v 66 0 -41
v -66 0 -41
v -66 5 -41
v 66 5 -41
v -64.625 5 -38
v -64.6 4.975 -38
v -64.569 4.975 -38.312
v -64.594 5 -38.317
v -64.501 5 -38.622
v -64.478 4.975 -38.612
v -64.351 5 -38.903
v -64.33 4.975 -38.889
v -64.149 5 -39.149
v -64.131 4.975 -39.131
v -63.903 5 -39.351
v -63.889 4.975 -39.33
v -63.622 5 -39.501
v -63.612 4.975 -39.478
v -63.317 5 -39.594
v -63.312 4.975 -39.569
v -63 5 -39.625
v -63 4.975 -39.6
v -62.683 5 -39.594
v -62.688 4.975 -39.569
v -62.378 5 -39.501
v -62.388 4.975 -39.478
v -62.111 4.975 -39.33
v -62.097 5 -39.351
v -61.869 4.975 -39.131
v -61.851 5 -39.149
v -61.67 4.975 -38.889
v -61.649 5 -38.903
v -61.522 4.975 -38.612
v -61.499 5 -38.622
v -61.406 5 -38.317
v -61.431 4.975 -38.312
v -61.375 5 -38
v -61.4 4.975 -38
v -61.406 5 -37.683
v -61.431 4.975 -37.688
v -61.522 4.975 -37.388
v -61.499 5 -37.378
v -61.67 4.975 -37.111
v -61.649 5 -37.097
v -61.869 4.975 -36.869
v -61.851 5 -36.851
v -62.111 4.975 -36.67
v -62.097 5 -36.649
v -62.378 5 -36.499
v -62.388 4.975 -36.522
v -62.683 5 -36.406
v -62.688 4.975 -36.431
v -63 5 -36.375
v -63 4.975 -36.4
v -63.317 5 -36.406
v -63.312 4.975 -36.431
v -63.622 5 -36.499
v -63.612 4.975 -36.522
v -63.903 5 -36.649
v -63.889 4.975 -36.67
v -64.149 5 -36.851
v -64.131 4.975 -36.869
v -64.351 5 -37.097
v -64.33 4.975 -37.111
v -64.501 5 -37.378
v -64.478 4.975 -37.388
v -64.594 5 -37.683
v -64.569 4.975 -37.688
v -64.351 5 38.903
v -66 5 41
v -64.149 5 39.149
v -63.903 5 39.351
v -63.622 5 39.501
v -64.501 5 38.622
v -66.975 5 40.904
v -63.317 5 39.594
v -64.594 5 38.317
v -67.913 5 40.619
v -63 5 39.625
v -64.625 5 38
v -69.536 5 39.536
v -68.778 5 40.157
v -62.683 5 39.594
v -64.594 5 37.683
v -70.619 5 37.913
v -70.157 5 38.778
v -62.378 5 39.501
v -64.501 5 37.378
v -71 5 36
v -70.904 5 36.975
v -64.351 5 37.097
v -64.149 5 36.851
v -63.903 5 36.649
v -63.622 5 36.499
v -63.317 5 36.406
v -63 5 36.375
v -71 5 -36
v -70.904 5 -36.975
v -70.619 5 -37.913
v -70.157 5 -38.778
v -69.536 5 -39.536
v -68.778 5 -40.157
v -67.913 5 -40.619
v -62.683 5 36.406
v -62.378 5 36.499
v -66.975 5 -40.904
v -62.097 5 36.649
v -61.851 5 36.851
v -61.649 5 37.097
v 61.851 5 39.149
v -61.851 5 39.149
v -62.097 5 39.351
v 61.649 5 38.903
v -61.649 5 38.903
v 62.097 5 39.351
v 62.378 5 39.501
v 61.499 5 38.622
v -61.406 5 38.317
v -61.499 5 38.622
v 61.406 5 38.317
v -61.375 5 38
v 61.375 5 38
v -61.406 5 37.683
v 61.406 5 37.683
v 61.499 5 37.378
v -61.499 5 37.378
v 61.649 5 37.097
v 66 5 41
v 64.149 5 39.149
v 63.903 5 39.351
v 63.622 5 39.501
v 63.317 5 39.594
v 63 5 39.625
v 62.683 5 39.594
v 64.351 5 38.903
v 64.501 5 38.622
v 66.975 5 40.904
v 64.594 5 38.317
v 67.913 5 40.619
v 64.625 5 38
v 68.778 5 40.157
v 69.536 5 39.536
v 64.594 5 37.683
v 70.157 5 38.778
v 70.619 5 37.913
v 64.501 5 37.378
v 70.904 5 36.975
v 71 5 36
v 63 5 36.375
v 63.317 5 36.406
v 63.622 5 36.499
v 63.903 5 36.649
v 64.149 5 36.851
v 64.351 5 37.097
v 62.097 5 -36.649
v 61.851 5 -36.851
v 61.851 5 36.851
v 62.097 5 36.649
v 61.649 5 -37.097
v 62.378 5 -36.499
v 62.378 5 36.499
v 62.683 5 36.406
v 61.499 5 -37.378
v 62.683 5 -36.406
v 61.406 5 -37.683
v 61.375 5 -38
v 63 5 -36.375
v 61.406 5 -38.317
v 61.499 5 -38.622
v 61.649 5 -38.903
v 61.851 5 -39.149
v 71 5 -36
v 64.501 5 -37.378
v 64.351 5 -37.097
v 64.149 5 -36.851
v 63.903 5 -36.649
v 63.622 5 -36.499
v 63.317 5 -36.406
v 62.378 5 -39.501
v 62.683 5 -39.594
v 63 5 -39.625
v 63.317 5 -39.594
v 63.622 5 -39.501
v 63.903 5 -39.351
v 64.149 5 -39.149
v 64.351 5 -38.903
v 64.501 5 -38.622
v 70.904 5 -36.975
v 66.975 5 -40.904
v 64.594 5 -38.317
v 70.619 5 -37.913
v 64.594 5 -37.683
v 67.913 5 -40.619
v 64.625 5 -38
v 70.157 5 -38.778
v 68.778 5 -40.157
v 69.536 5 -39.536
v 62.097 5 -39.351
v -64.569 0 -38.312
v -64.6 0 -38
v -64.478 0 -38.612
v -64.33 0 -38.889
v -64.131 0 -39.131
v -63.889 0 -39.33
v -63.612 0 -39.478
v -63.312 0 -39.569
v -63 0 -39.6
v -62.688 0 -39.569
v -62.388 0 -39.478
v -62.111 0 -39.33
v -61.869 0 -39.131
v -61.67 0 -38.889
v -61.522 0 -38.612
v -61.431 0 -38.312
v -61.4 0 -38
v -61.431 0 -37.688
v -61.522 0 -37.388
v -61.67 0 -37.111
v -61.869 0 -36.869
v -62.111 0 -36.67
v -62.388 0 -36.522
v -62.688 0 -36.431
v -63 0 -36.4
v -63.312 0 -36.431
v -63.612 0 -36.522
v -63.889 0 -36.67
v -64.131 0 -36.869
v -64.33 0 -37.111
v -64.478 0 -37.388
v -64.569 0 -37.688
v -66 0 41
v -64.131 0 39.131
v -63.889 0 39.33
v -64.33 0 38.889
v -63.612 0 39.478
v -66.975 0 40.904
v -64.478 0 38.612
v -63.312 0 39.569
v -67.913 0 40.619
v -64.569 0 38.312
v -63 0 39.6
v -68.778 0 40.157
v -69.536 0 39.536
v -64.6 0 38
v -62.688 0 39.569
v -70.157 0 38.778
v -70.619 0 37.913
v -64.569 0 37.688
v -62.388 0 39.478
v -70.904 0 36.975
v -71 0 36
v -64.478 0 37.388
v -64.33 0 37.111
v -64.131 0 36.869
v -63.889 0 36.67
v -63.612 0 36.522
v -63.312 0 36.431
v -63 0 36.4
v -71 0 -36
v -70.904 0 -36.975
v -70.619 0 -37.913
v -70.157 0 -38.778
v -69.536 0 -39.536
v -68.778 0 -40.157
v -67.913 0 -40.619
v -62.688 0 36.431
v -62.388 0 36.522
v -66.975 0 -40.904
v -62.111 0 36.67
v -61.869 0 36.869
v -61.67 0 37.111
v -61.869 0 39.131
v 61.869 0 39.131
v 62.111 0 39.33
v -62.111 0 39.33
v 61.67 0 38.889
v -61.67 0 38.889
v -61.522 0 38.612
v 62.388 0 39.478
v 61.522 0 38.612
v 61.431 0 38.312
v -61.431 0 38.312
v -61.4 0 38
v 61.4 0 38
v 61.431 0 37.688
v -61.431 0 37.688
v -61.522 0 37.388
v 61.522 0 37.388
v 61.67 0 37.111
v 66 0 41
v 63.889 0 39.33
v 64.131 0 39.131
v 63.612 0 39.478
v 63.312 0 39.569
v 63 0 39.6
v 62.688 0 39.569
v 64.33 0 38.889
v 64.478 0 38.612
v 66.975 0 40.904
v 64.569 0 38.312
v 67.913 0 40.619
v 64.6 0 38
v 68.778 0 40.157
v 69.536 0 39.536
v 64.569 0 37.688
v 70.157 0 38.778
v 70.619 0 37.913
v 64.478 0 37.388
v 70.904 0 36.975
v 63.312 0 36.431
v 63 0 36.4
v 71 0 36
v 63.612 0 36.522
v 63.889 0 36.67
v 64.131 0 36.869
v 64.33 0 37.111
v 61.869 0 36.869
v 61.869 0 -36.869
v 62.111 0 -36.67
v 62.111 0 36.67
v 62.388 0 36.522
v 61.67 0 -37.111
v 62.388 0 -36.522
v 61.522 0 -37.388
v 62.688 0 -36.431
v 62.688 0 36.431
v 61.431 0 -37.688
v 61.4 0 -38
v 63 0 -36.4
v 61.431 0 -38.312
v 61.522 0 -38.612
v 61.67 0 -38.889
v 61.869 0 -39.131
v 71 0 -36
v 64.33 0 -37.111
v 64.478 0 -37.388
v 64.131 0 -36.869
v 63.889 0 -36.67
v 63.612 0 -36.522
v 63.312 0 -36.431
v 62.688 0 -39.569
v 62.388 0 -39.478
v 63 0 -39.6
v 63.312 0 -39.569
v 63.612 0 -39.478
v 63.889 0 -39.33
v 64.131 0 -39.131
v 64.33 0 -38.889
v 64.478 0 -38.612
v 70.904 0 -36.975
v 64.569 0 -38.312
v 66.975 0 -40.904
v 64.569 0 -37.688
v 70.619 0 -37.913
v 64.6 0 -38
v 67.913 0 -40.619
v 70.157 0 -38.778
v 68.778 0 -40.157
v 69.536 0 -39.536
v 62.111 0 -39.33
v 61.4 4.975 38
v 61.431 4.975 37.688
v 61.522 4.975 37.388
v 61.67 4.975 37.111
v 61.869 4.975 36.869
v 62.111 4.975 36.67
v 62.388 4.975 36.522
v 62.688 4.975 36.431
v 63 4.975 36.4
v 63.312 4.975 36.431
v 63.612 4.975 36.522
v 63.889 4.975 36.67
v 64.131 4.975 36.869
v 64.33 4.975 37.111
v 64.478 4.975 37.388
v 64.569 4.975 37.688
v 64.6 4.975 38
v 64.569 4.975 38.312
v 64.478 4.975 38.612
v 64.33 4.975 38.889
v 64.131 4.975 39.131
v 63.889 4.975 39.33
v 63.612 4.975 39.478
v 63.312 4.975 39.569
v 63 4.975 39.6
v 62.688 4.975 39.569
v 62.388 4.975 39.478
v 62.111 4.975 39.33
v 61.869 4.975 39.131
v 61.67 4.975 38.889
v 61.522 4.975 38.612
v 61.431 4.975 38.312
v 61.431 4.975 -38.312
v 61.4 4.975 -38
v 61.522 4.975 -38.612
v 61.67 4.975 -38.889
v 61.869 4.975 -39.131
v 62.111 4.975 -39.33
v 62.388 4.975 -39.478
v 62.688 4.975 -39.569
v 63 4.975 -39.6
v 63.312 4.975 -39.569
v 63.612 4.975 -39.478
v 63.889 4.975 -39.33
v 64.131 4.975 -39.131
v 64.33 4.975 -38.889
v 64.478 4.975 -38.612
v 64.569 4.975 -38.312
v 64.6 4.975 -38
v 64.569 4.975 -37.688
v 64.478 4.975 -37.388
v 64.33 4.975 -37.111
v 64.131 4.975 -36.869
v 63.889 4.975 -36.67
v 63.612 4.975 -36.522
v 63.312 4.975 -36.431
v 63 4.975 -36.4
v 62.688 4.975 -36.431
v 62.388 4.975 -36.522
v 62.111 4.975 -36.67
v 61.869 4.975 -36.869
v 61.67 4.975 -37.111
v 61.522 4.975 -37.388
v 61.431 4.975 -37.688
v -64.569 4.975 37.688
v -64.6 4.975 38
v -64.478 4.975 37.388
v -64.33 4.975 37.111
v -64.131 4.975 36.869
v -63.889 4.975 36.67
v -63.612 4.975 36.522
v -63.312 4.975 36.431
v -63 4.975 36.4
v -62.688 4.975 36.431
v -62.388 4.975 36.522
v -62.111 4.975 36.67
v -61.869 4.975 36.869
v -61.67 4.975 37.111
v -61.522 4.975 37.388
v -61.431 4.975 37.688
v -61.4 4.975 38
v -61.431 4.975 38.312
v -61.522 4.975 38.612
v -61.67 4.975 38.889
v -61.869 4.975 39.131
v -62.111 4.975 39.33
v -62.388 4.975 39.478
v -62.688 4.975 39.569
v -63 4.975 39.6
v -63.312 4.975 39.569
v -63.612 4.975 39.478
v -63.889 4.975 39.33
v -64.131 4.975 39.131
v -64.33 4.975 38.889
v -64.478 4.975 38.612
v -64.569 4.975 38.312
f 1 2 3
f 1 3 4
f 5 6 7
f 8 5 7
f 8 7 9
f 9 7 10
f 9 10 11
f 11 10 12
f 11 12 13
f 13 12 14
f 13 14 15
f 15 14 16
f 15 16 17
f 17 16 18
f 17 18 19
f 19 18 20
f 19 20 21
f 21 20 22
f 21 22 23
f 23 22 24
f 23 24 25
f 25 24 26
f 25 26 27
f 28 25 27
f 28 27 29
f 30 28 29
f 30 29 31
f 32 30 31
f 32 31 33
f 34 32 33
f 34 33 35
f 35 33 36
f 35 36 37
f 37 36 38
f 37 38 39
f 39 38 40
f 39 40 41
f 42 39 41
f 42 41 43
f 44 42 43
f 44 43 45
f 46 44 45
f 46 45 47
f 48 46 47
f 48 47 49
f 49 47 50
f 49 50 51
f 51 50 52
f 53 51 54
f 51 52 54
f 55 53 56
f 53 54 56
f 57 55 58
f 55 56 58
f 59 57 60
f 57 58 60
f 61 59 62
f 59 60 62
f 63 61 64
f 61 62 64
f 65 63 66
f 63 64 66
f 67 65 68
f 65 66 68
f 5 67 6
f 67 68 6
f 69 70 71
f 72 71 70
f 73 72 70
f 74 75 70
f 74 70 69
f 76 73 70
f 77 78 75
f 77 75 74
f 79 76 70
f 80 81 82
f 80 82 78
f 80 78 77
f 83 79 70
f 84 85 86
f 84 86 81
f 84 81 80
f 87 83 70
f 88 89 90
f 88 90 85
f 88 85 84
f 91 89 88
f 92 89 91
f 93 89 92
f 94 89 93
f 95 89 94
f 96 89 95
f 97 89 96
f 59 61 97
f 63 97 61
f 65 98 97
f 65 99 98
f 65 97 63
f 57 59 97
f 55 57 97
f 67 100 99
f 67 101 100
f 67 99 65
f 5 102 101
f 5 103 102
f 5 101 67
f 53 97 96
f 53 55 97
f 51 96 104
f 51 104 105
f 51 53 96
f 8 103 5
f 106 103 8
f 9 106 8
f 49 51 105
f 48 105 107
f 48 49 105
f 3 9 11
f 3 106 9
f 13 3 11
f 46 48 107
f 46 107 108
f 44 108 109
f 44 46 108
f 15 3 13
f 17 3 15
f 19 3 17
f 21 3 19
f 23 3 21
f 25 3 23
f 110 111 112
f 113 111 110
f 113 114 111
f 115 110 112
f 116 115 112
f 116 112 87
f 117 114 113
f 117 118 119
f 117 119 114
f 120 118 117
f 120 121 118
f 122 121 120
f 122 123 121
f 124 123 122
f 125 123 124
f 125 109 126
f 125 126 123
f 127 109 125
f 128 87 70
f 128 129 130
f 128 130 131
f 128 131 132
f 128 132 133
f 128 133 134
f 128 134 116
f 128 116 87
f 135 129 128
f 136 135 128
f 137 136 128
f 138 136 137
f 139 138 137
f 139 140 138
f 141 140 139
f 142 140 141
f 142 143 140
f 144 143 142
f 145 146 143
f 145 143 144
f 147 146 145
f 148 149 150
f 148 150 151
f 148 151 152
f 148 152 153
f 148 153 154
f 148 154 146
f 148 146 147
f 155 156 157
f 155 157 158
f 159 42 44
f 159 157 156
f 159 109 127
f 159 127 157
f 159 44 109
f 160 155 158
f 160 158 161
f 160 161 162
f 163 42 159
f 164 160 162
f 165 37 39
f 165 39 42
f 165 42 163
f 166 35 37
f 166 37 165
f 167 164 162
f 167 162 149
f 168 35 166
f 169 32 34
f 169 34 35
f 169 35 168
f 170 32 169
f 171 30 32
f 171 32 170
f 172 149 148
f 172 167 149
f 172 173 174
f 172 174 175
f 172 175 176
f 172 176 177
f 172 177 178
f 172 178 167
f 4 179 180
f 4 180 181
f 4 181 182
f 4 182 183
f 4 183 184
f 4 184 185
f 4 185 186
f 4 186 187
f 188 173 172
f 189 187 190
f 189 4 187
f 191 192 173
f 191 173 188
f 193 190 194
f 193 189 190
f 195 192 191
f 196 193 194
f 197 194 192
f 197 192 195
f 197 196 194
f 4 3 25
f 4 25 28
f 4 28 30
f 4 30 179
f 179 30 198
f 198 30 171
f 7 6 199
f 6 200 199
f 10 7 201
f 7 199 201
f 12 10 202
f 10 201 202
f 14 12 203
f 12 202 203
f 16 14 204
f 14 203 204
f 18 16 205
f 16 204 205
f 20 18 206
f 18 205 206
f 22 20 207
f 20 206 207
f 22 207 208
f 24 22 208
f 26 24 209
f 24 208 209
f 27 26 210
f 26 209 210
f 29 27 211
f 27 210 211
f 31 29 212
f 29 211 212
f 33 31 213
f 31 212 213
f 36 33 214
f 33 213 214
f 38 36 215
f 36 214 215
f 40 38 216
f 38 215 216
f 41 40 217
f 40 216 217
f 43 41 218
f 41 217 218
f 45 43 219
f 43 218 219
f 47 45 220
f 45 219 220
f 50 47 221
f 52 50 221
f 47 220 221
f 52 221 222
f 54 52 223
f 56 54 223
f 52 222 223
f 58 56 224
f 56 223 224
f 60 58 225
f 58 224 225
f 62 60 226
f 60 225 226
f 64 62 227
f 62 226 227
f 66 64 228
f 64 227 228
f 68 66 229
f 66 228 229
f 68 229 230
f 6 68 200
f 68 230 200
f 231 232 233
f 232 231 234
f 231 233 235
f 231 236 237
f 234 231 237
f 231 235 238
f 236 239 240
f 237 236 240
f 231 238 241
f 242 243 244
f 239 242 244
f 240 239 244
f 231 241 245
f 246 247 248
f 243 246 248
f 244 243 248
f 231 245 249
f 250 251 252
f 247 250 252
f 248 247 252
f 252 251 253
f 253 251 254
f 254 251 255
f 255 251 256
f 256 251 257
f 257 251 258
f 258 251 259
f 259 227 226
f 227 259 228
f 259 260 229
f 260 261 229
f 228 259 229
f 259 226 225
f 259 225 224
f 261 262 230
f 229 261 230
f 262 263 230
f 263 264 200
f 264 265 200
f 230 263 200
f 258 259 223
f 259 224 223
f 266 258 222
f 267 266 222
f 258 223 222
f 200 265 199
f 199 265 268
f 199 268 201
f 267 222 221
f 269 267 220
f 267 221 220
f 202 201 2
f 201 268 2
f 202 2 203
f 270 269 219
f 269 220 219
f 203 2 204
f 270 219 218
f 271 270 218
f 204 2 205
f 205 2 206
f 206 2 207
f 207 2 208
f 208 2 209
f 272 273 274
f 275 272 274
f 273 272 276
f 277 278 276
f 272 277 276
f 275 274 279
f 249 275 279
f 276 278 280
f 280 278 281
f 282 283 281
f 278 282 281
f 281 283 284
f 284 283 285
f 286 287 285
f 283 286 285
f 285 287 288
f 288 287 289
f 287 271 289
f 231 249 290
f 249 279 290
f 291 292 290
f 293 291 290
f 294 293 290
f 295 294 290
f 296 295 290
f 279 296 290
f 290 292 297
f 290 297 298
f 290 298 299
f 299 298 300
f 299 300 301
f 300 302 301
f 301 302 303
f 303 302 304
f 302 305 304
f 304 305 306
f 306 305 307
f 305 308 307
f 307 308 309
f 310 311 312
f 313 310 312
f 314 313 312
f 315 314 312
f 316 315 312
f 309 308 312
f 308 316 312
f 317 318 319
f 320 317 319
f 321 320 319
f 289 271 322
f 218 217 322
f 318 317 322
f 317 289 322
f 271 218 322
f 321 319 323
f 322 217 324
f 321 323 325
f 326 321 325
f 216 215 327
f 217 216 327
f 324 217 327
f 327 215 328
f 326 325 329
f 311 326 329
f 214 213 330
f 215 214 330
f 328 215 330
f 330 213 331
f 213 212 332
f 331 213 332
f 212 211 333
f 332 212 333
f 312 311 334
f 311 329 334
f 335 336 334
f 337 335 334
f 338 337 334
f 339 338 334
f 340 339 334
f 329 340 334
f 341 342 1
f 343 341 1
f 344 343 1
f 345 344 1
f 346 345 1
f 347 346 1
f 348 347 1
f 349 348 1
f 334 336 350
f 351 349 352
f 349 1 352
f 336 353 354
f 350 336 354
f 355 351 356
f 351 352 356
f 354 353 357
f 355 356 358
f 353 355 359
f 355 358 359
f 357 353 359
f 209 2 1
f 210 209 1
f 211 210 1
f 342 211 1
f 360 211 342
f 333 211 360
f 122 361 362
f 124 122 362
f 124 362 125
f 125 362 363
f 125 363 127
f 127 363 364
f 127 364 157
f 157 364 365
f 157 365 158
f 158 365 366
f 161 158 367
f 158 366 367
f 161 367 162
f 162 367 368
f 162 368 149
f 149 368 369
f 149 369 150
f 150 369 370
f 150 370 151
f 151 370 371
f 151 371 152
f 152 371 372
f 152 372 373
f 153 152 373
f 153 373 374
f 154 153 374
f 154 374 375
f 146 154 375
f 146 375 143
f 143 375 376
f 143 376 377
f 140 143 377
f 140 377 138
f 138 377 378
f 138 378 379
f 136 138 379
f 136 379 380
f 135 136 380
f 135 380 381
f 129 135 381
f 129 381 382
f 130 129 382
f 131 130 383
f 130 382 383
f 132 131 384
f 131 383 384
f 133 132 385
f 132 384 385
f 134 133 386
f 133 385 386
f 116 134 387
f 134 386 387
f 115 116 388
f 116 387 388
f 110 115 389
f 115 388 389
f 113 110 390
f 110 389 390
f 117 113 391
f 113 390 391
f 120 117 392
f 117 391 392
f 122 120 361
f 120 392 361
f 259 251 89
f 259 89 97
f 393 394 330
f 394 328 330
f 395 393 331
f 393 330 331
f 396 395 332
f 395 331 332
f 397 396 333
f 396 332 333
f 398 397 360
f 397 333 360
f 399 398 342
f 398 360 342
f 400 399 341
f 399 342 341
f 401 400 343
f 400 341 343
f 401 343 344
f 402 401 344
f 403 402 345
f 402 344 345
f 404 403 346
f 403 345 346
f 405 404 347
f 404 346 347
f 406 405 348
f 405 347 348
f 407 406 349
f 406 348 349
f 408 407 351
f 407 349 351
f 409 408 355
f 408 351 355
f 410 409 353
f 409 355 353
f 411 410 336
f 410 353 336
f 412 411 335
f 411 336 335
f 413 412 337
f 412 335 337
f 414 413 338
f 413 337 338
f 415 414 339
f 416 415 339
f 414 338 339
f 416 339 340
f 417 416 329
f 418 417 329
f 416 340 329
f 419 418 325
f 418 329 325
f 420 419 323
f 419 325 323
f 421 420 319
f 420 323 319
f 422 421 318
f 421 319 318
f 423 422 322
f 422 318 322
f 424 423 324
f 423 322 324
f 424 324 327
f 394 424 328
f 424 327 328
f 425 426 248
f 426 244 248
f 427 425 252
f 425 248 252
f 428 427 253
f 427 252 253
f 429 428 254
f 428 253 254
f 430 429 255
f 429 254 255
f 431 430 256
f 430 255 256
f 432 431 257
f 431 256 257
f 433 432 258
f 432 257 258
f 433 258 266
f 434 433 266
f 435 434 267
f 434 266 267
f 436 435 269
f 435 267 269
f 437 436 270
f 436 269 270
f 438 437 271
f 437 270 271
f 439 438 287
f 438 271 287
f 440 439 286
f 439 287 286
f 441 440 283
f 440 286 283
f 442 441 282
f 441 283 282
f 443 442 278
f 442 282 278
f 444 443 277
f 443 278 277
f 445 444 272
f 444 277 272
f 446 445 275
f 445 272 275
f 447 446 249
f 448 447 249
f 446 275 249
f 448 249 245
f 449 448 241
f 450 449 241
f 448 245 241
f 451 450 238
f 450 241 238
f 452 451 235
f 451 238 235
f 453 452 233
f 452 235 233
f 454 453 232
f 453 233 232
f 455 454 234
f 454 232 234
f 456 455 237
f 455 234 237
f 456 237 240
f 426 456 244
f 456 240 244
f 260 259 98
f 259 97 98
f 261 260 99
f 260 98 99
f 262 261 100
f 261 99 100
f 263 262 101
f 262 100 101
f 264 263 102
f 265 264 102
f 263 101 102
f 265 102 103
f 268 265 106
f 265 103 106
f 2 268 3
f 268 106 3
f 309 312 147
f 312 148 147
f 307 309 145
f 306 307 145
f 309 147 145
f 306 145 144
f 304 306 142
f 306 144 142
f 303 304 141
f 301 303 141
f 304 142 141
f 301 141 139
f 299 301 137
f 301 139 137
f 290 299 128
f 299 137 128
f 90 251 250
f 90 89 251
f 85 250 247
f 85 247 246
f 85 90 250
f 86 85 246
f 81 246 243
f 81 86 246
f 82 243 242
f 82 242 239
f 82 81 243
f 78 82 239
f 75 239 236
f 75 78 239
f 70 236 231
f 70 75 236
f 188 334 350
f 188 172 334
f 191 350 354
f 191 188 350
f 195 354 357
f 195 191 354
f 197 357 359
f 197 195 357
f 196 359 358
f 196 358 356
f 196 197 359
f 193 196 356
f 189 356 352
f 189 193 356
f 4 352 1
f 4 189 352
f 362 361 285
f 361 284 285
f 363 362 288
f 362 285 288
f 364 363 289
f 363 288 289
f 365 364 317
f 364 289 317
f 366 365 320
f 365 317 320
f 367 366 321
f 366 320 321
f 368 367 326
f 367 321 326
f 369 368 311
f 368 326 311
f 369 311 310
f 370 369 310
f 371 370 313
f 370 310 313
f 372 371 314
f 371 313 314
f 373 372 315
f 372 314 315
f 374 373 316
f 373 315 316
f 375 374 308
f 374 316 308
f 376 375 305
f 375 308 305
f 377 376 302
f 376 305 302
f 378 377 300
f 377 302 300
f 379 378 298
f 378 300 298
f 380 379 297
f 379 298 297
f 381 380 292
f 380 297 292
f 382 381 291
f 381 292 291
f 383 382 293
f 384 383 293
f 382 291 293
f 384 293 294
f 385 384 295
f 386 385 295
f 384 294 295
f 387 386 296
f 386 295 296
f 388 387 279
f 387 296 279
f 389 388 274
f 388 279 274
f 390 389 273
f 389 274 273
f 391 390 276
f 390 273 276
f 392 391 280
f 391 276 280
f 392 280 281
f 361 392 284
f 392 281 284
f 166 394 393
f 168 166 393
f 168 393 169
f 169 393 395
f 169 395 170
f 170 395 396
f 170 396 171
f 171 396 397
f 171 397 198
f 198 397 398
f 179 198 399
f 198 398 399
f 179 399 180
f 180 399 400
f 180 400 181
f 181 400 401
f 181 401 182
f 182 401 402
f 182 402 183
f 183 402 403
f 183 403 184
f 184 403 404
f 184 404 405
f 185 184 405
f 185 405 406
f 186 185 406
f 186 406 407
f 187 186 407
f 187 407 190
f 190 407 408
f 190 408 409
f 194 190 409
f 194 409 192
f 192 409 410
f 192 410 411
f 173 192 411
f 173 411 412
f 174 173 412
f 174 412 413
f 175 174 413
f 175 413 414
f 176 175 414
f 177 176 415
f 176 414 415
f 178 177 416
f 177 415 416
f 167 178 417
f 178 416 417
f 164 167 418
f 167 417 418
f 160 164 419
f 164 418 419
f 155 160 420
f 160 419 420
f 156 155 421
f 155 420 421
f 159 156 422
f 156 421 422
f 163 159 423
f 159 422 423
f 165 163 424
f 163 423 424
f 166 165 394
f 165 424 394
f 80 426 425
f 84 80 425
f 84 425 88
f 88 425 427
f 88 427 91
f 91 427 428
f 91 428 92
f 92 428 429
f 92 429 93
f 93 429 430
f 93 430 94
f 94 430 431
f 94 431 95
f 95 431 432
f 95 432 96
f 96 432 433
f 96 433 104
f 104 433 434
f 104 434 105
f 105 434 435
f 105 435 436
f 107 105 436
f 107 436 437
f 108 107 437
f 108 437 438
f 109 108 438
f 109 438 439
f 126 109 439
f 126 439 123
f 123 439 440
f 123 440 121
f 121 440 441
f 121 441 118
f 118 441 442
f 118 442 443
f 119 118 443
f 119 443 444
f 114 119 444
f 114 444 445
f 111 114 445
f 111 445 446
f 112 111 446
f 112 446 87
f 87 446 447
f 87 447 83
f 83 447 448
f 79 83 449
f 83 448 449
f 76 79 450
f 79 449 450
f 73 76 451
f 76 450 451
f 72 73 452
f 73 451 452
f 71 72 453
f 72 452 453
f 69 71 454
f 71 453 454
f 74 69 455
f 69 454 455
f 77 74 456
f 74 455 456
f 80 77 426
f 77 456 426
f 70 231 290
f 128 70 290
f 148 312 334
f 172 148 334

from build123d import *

# Parameters (mm, degrees)
SKETCH1_W                      = 142
SKETCH1_H                      = 82
BOSS_EXTRUDE1_DEPTH            = 5
M3_CLEARANCE_HOLE1_D           = 3.2
M3_CLEARANCE_HOLE1_CSINK_D     = 3.25
M3_CLEARANCE_HOLE1_CSINK_ANGLE = 90
FILLET1_R                      = 5


with BuildPart() as part:
    # Sketch1 → Boss-Extrude1 (new body)
    with BuildSketch(Plane(origin=(0, 0, 0), x_dir=(1, 0, 0), z_dir=(0, 1, 0))):
        Rectangle(SKETCH1_W, SKETCH1_H)
    extrude(amount=BOSS_EXTRUDE1_DEPTH)

    # M3 Clearance Hole1 (through all)
    with Locations(Plane(origin=(0, 5, 0), x_dir=(1, 0, 0), z_dir=(0, 1, 0))):
        with Locations((-63, 38), (-63, -38), (63, 38), (63, -38)):
            CounterSinkHole(M3_CLEARANCE_HOLE1_D / 2, M3_CLEARANCE_HOLE1_CSINK_D / 2, counter_sink_angle=M3_CLEARANCE_HOLE1_CSINK_ANGLE)

    # Fillet1
    fillet1_edges = [part.edges().sort_by_distance(p)[0] for p in [
        (71, 2.5, 41),
        (-71, 2.5, 41),
        (-71, 2.5, -41),
        (71, 2.5, -41),
    ]]
    fillet(fillet1_edges, radius=FILLET1_R)


solid = part.part
